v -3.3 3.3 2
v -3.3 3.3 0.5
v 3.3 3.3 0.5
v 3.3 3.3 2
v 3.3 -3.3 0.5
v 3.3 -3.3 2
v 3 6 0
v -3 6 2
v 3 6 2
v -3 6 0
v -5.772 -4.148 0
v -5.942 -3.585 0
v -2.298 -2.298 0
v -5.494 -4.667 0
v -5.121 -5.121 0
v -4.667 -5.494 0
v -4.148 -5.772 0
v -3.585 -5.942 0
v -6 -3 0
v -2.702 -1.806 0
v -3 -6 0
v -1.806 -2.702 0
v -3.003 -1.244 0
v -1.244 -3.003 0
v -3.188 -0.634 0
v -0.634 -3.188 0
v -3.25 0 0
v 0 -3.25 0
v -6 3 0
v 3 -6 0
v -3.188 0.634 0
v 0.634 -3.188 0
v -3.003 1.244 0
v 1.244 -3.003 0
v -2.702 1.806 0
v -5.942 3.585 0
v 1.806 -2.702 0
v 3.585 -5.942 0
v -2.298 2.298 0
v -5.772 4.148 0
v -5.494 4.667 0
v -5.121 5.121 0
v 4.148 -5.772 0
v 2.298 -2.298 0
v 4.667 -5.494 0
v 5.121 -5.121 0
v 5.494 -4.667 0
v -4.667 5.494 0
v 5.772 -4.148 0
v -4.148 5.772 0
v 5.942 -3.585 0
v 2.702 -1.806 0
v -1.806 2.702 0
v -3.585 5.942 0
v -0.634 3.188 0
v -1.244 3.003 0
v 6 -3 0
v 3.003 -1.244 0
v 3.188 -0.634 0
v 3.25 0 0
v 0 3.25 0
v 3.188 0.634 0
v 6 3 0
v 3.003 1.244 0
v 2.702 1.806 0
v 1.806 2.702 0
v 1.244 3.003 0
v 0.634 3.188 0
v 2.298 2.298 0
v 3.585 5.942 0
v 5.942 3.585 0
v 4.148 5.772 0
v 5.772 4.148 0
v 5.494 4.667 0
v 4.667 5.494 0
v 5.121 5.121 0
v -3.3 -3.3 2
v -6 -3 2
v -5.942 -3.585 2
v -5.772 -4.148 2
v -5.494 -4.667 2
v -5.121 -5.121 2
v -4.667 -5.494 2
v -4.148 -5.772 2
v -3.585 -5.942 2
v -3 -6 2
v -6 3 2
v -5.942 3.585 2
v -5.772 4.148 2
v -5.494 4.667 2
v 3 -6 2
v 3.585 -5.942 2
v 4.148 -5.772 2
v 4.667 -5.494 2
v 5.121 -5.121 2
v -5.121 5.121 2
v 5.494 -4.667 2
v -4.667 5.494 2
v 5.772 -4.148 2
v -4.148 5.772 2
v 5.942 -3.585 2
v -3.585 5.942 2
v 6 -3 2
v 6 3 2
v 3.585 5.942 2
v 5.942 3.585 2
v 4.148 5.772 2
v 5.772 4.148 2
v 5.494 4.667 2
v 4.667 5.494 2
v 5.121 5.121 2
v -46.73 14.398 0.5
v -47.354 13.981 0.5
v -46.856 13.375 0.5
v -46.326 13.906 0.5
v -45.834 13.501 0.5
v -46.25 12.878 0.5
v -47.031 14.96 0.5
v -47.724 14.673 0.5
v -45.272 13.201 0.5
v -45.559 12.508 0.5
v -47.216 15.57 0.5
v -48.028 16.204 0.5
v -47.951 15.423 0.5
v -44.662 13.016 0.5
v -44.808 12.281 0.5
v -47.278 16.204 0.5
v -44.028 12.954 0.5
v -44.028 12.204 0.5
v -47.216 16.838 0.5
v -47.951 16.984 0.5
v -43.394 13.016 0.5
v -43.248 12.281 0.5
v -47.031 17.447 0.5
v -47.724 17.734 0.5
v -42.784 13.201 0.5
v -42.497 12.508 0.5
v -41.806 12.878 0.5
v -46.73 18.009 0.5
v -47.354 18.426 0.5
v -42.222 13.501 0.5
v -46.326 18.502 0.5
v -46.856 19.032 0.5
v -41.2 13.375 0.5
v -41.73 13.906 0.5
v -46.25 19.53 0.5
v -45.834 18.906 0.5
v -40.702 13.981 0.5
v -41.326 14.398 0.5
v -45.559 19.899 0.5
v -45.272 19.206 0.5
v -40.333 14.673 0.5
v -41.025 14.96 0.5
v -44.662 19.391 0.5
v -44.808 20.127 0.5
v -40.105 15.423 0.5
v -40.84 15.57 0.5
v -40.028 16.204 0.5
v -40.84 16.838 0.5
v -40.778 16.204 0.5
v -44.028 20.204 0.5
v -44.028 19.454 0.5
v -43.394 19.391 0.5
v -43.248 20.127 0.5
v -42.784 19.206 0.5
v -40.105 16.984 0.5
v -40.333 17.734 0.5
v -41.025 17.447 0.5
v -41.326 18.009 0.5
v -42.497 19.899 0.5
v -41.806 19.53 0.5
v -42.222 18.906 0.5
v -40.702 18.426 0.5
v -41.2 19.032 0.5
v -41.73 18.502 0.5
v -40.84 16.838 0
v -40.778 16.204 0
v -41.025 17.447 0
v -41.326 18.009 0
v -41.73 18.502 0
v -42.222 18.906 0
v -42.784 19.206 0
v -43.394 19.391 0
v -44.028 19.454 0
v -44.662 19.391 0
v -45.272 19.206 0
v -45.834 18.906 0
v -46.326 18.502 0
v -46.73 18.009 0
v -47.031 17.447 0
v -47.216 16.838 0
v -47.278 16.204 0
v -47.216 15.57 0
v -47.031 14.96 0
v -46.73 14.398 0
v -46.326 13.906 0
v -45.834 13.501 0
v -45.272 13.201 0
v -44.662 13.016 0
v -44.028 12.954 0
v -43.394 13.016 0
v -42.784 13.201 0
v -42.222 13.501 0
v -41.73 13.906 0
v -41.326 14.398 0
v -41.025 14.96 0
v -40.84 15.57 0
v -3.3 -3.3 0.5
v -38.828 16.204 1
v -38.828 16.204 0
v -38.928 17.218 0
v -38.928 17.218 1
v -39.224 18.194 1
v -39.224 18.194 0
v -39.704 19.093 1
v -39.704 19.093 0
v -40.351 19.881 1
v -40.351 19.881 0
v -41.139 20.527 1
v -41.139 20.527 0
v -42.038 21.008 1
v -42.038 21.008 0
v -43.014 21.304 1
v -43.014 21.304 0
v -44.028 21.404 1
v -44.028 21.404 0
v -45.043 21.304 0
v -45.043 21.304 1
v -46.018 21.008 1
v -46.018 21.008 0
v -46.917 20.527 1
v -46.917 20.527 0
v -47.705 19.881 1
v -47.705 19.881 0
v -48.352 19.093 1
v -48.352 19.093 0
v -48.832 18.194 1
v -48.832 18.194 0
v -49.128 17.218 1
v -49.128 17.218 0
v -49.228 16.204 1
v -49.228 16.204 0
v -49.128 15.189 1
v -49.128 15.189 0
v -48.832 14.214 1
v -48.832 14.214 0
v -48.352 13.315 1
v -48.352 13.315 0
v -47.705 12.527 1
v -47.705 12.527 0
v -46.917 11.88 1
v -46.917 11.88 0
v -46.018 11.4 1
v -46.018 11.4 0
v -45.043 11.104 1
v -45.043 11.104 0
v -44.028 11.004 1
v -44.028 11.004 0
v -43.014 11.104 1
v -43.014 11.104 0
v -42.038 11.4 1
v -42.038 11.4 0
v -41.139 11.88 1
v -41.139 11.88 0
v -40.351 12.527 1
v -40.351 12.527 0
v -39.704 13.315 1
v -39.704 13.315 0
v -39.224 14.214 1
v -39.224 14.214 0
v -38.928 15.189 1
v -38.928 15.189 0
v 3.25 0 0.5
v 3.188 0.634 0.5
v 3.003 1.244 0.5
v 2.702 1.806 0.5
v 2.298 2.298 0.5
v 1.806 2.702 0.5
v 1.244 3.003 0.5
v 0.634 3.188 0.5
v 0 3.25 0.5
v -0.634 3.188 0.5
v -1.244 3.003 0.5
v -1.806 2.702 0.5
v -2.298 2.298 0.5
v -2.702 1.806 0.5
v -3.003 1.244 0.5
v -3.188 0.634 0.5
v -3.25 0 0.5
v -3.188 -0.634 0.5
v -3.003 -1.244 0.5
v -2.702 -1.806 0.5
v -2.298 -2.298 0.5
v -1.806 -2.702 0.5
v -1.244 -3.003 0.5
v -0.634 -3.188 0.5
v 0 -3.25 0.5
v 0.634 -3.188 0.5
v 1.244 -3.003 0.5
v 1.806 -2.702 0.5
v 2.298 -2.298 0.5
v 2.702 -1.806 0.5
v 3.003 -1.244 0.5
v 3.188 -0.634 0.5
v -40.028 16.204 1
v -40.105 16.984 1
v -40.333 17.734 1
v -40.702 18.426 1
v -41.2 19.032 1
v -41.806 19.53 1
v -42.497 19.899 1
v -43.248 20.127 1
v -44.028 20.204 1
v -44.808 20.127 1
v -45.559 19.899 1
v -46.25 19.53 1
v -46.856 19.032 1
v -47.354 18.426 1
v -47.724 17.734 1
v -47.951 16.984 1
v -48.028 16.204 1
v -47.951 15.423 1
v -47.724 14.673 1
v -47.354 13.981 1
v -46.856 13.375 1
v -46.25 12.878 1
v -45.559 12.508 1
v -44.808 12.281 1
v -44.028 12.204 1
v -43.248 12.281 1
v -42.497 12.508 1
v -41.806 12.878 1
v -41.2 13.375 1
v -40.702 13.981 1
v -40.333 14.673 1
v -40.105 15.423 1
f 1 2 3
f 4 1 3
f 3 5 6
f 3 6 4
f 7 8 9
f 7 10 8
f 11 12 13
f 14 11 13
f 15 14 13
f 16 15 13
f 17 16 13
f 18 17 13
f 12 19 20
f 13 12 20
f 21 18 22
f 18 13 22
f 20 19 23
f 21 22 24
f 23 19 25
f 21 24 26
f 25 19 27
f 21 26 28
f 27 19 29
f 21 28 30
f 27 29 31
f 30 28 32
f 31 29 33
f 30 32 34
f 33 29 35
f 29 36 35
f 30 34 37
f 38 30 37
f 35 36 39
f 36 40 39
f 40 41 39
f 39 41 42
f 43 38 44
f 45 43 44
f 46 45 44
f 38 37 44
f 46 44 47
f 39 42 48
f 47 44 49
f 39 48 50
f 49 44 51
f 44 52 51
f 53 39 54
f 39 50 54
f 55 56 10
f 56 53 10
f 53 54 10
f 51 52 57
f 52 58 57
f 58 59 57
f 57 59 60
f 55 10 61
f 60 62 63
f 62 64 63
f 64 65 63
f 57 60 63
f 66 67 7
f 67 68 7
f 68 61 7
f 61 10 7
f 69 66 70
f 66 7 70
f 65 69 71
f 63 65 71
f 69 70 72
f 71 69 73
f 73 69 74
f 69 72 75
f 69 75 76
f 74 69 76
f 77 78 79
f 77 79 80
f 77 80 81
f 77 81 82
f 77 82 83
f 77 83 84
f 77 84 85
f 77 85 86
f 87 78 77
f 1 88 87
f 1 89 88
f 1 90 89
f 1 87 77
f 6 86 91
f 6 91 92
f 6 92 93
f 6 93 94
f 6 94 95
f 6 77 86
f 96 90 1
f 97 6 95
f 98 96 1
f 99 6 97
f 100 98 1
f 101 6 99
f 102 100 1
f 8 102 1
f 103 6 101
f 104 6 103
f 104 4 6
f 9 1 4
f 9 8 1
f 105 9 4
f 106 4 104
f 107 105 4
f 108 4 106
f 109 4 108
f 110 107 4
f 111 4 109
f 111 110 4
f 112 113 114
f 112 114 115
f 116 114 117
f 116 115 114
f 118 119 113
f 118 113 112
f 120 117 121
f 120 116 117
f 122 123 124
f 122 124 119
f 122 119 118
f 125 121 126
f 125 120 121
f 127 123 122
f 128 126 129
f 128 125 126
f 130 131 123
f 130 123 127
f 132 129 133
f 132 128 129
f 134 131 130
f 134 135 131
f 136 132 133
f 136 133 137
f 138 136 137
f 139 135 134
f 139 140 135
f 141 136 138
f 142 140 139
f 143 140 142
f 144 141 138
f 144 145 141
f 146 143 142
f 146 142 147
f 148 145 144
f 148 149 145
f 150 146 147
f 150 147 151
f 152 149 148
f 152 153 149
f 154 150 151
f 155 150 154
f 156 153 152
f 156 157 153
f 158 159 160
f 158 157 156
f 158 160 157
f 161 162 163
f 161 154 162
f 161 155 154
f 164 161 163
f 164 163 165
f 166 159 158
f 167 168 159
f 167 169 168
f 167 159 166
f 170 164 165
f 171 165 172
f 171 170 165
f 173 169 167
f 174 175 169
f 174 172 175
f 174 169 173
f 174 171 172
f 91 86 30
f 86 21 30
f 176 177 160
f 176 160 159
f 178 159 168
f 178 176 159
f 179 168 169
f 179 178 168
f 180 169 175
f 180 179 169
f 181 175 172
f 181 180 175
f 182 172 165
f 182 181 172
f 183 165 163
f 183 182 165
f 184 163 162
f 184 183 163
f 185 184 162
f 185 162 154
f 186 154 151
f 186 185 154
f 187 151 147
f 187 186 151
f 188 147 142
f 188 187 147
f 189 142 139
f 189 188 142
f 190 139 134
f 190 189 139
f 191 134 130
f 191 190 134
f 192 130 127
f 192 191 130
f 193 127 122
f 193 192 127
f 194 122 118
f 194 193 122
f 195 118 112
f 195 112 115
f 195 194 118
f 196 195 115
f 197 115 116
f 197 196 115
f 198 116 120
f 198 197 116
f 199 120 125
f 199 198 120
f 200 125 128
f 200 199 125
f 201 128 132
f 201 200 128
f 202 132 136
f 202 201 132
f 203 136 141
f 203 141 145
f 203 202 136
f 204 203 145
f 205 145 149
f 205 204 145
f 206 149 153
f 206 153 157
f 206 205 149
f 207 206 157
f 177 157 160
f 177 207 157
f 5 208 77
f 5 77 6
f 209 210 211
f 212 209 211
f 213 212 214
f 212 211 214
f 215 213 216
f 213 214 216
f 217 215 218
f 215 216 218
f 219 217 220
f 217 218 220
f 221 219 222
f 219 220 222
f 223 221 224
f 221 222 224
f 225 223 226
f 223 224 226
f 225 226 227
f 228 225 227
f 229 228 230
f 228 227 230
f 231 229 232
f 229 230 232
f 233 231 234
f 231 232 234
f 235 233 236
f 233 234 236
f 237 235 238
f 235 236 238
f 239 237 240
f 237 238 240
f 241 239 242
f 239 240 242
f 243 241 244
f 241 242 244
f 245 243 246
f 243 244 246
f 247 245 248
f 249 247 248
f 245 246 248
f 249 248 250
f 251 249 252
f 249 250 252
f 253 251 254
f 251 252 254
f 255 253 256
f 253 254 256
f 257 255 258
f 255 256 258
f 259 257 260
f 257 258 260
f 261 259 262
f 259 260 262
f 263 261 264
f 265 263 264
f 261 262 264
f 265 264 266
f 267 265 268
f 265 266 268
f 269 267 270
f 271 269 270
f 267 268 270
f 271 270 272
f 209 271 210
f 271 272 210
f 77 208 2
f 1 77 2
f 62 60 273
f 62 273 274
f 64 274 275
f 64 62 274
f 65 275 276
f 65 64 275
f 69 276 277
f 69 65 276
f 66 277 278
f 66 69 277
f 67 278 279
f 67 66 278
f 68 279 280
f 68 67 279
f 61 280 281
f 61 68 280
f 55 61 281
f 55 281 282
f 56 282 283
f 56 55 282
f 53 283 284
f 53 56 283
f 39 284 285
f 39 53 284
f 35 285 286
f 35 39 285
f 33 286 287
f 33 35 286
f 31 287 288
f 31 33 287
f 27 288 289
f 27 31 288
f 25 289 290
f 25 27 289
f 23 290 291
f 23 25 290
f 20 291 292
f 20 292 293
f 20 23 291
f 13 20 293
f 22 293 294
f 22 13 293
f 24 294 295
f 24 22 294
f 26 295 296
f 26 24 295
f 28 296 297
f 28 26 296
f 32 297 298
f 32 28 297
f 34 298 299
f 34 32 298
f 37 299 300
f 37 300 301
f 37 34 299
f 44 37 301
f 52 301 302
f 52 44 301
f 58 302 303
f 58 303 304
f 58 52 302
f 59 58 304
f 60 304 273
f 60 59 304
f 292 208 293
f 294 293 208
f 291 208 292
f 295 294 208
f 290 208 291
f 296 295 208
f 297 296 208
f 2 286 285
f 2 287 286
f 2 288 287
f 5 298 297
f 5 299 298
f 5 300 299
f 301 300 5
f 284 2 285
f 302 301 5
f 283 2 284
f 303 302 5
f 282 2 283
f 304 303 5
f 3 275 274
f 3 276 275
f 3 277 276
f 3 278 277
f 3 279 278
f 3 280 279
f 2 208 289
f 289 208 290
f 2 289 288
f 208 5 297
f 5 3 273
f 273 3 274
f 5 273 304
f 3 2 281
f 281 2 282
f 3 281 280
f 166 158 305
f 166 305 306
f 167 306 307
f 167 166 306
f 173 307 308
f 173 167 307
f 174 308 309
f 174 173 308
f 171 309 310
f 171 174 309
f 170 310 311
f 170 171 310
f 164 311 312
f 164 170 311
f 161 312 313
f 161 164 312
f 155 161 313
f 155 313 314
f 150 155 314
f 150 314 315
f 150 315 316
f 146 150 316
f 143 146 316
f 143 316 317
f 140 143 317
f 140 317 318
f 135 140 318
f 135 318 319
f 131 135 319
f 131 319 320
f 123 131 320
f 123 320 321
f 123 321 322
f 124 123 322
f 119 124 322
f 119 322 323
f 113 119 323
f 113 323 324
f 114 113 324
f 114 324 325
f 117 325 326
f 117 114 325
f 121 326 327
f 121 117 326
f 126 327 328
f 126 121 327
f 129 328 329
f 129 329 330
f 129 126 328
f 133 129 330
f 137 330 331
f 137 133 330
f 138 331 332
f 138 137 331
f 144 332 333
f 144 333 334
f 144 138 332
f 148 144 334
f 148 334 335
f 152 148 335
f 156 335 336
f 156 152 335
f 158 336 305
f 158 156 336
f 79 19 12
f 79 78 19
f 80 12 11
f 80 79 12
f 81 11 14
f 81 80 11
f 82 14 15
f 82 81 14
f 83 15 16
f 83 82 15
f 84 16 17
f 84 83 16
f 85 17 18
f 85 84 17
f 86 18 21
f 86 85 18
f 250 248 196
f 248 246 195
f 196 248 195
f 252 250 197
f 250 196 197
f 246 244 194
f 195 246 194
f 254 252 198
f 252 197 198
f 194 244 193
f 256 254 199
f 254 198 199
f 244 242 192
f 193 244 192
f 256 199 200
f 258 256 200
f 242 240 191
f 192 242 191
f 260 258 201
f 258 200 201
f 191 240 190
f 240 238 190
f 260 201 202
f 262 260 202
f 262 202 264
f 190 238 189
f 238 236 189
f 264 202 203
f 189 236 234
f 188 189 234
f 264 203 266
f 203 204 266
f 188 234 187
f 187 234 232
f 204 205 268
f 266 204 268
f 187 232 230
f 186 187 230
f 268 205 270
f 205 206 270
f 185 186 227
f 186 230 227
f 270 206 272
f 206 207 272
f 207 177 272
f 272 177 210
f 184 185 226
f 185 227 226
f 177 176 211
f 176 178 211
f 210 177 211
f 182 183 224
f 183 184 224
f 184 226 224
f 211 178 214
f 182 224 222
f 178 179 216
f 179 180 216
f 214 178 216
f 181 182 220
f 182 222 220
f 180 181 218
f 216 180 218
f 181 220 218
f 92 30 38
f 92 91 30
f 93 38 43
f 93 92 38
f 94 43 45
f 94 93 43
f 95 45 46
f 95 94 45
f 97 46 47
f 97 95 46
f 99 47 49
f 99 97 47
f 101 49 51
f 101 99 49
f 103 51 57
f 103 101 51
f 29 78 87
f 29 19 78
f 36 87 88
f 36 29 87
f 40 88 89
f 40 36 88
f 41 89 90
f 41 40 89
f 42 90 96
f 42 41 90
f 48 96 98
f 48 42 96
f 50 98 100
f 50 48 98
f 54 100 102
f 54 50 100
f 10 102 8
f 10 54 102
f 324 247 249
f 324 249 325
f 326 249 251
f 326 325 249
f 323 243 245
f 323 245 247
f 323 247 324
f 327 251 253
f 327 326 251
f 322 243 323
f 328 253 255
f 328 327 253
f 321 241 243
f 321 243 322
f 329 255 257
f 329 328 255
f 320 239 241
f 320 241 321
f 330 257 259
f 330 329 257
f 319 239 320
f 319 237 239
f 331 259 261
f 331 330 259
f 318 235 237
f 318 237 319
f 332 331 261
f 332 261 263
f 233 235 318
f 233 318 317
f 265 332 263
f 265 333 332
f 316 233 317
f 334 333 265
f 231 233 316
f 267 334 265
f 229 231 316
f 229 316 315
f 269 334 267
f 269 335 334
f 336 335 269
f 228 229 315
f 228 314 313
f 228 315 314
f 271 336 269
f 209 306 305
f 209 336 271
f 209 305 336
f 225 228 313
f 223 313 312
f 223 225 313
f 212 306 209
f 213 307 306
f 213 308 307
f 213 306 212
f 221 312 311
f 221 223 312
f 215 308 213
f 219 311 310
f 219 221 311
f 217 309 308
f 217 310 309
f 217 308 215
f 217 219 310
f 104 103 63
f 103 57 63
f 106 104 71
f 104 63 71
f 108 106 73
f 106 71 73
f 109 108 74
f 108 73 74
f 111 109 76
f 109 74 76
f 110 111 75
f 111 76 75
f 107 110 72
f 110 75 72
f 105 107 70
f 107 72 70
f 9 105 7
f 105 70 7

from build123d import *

# Parameters (mm, degrees)
F3_W      = 12
F3_H      = 12
F3_R      = 3.25
F4_DEPTH  = 0.5
F5_W      = 12
F5_H      = 12
F5_W_2    = 6.6
F5_H_2    = 6.6
F6_DEPTH  = 1.5
F7_R      = 3
F8_R      = 5.2
F8_R_2    = 4
F9_DEPTH  = 1
F8_R_3    = 3.25
F10_DEPTH = 0.5


with BuildPart() as f4:
    # F3 (on Top) → F4 (new body)
    with BuildSketch(Plane.XY):
        Rectangle(F3_W, F3_H)
        Circle(F3_R, mode=Mode.SUBTRACT)
    extrude(amount=F4_DEPTH)

    # F5 (on face) → F6 (join)
    with BuildSketch(Plane.XY.offset(0.5)):
        Rectangle(F5_W, F5_H)
        Rectangle(F5_W_2, F5_H_2, mode=Mode.SUBTRACT)
    extrude(amount=F6_DEPTH)

    # F7
    f7_edges = [f4.edges().sort_by_distance(p)[0] for p in [
        (-6, 6, 1),
        (6, 6, 1),
        (6, -6, 1),
        (-6, -6, 1),
    ]]
    fillet(f7_edges, radius=F7_R)


with BuildPart() as f9:
    # F8 (on Top) → F9 (new body)
    with BuildSketch(Plane.XY):
        with Locations((-44.0280437469, 16.2037536502)):
            Circle(F8_R)
        with Locations((-44.0280437469, 16.2037536502)):
            Circle(F8_R_2, mode=Mode.SUBTRACT)
    extrude(amount=F9_DEPTH)

    # F8 (on Top) → F10 (join)
    with BuildSketch(Plane.XY):
        with Locations((-44.0280437469, 16.2037536502)):
            Circle(F8_R_2)
        with Locations((-44.0280437469, 16.2037536502)):
            Circle(F8_R_3, mode=Mode.SUBTRACT)
    extrude(amount=F10_DEPTH)


solid = Compound([f4.part, f9.part])
